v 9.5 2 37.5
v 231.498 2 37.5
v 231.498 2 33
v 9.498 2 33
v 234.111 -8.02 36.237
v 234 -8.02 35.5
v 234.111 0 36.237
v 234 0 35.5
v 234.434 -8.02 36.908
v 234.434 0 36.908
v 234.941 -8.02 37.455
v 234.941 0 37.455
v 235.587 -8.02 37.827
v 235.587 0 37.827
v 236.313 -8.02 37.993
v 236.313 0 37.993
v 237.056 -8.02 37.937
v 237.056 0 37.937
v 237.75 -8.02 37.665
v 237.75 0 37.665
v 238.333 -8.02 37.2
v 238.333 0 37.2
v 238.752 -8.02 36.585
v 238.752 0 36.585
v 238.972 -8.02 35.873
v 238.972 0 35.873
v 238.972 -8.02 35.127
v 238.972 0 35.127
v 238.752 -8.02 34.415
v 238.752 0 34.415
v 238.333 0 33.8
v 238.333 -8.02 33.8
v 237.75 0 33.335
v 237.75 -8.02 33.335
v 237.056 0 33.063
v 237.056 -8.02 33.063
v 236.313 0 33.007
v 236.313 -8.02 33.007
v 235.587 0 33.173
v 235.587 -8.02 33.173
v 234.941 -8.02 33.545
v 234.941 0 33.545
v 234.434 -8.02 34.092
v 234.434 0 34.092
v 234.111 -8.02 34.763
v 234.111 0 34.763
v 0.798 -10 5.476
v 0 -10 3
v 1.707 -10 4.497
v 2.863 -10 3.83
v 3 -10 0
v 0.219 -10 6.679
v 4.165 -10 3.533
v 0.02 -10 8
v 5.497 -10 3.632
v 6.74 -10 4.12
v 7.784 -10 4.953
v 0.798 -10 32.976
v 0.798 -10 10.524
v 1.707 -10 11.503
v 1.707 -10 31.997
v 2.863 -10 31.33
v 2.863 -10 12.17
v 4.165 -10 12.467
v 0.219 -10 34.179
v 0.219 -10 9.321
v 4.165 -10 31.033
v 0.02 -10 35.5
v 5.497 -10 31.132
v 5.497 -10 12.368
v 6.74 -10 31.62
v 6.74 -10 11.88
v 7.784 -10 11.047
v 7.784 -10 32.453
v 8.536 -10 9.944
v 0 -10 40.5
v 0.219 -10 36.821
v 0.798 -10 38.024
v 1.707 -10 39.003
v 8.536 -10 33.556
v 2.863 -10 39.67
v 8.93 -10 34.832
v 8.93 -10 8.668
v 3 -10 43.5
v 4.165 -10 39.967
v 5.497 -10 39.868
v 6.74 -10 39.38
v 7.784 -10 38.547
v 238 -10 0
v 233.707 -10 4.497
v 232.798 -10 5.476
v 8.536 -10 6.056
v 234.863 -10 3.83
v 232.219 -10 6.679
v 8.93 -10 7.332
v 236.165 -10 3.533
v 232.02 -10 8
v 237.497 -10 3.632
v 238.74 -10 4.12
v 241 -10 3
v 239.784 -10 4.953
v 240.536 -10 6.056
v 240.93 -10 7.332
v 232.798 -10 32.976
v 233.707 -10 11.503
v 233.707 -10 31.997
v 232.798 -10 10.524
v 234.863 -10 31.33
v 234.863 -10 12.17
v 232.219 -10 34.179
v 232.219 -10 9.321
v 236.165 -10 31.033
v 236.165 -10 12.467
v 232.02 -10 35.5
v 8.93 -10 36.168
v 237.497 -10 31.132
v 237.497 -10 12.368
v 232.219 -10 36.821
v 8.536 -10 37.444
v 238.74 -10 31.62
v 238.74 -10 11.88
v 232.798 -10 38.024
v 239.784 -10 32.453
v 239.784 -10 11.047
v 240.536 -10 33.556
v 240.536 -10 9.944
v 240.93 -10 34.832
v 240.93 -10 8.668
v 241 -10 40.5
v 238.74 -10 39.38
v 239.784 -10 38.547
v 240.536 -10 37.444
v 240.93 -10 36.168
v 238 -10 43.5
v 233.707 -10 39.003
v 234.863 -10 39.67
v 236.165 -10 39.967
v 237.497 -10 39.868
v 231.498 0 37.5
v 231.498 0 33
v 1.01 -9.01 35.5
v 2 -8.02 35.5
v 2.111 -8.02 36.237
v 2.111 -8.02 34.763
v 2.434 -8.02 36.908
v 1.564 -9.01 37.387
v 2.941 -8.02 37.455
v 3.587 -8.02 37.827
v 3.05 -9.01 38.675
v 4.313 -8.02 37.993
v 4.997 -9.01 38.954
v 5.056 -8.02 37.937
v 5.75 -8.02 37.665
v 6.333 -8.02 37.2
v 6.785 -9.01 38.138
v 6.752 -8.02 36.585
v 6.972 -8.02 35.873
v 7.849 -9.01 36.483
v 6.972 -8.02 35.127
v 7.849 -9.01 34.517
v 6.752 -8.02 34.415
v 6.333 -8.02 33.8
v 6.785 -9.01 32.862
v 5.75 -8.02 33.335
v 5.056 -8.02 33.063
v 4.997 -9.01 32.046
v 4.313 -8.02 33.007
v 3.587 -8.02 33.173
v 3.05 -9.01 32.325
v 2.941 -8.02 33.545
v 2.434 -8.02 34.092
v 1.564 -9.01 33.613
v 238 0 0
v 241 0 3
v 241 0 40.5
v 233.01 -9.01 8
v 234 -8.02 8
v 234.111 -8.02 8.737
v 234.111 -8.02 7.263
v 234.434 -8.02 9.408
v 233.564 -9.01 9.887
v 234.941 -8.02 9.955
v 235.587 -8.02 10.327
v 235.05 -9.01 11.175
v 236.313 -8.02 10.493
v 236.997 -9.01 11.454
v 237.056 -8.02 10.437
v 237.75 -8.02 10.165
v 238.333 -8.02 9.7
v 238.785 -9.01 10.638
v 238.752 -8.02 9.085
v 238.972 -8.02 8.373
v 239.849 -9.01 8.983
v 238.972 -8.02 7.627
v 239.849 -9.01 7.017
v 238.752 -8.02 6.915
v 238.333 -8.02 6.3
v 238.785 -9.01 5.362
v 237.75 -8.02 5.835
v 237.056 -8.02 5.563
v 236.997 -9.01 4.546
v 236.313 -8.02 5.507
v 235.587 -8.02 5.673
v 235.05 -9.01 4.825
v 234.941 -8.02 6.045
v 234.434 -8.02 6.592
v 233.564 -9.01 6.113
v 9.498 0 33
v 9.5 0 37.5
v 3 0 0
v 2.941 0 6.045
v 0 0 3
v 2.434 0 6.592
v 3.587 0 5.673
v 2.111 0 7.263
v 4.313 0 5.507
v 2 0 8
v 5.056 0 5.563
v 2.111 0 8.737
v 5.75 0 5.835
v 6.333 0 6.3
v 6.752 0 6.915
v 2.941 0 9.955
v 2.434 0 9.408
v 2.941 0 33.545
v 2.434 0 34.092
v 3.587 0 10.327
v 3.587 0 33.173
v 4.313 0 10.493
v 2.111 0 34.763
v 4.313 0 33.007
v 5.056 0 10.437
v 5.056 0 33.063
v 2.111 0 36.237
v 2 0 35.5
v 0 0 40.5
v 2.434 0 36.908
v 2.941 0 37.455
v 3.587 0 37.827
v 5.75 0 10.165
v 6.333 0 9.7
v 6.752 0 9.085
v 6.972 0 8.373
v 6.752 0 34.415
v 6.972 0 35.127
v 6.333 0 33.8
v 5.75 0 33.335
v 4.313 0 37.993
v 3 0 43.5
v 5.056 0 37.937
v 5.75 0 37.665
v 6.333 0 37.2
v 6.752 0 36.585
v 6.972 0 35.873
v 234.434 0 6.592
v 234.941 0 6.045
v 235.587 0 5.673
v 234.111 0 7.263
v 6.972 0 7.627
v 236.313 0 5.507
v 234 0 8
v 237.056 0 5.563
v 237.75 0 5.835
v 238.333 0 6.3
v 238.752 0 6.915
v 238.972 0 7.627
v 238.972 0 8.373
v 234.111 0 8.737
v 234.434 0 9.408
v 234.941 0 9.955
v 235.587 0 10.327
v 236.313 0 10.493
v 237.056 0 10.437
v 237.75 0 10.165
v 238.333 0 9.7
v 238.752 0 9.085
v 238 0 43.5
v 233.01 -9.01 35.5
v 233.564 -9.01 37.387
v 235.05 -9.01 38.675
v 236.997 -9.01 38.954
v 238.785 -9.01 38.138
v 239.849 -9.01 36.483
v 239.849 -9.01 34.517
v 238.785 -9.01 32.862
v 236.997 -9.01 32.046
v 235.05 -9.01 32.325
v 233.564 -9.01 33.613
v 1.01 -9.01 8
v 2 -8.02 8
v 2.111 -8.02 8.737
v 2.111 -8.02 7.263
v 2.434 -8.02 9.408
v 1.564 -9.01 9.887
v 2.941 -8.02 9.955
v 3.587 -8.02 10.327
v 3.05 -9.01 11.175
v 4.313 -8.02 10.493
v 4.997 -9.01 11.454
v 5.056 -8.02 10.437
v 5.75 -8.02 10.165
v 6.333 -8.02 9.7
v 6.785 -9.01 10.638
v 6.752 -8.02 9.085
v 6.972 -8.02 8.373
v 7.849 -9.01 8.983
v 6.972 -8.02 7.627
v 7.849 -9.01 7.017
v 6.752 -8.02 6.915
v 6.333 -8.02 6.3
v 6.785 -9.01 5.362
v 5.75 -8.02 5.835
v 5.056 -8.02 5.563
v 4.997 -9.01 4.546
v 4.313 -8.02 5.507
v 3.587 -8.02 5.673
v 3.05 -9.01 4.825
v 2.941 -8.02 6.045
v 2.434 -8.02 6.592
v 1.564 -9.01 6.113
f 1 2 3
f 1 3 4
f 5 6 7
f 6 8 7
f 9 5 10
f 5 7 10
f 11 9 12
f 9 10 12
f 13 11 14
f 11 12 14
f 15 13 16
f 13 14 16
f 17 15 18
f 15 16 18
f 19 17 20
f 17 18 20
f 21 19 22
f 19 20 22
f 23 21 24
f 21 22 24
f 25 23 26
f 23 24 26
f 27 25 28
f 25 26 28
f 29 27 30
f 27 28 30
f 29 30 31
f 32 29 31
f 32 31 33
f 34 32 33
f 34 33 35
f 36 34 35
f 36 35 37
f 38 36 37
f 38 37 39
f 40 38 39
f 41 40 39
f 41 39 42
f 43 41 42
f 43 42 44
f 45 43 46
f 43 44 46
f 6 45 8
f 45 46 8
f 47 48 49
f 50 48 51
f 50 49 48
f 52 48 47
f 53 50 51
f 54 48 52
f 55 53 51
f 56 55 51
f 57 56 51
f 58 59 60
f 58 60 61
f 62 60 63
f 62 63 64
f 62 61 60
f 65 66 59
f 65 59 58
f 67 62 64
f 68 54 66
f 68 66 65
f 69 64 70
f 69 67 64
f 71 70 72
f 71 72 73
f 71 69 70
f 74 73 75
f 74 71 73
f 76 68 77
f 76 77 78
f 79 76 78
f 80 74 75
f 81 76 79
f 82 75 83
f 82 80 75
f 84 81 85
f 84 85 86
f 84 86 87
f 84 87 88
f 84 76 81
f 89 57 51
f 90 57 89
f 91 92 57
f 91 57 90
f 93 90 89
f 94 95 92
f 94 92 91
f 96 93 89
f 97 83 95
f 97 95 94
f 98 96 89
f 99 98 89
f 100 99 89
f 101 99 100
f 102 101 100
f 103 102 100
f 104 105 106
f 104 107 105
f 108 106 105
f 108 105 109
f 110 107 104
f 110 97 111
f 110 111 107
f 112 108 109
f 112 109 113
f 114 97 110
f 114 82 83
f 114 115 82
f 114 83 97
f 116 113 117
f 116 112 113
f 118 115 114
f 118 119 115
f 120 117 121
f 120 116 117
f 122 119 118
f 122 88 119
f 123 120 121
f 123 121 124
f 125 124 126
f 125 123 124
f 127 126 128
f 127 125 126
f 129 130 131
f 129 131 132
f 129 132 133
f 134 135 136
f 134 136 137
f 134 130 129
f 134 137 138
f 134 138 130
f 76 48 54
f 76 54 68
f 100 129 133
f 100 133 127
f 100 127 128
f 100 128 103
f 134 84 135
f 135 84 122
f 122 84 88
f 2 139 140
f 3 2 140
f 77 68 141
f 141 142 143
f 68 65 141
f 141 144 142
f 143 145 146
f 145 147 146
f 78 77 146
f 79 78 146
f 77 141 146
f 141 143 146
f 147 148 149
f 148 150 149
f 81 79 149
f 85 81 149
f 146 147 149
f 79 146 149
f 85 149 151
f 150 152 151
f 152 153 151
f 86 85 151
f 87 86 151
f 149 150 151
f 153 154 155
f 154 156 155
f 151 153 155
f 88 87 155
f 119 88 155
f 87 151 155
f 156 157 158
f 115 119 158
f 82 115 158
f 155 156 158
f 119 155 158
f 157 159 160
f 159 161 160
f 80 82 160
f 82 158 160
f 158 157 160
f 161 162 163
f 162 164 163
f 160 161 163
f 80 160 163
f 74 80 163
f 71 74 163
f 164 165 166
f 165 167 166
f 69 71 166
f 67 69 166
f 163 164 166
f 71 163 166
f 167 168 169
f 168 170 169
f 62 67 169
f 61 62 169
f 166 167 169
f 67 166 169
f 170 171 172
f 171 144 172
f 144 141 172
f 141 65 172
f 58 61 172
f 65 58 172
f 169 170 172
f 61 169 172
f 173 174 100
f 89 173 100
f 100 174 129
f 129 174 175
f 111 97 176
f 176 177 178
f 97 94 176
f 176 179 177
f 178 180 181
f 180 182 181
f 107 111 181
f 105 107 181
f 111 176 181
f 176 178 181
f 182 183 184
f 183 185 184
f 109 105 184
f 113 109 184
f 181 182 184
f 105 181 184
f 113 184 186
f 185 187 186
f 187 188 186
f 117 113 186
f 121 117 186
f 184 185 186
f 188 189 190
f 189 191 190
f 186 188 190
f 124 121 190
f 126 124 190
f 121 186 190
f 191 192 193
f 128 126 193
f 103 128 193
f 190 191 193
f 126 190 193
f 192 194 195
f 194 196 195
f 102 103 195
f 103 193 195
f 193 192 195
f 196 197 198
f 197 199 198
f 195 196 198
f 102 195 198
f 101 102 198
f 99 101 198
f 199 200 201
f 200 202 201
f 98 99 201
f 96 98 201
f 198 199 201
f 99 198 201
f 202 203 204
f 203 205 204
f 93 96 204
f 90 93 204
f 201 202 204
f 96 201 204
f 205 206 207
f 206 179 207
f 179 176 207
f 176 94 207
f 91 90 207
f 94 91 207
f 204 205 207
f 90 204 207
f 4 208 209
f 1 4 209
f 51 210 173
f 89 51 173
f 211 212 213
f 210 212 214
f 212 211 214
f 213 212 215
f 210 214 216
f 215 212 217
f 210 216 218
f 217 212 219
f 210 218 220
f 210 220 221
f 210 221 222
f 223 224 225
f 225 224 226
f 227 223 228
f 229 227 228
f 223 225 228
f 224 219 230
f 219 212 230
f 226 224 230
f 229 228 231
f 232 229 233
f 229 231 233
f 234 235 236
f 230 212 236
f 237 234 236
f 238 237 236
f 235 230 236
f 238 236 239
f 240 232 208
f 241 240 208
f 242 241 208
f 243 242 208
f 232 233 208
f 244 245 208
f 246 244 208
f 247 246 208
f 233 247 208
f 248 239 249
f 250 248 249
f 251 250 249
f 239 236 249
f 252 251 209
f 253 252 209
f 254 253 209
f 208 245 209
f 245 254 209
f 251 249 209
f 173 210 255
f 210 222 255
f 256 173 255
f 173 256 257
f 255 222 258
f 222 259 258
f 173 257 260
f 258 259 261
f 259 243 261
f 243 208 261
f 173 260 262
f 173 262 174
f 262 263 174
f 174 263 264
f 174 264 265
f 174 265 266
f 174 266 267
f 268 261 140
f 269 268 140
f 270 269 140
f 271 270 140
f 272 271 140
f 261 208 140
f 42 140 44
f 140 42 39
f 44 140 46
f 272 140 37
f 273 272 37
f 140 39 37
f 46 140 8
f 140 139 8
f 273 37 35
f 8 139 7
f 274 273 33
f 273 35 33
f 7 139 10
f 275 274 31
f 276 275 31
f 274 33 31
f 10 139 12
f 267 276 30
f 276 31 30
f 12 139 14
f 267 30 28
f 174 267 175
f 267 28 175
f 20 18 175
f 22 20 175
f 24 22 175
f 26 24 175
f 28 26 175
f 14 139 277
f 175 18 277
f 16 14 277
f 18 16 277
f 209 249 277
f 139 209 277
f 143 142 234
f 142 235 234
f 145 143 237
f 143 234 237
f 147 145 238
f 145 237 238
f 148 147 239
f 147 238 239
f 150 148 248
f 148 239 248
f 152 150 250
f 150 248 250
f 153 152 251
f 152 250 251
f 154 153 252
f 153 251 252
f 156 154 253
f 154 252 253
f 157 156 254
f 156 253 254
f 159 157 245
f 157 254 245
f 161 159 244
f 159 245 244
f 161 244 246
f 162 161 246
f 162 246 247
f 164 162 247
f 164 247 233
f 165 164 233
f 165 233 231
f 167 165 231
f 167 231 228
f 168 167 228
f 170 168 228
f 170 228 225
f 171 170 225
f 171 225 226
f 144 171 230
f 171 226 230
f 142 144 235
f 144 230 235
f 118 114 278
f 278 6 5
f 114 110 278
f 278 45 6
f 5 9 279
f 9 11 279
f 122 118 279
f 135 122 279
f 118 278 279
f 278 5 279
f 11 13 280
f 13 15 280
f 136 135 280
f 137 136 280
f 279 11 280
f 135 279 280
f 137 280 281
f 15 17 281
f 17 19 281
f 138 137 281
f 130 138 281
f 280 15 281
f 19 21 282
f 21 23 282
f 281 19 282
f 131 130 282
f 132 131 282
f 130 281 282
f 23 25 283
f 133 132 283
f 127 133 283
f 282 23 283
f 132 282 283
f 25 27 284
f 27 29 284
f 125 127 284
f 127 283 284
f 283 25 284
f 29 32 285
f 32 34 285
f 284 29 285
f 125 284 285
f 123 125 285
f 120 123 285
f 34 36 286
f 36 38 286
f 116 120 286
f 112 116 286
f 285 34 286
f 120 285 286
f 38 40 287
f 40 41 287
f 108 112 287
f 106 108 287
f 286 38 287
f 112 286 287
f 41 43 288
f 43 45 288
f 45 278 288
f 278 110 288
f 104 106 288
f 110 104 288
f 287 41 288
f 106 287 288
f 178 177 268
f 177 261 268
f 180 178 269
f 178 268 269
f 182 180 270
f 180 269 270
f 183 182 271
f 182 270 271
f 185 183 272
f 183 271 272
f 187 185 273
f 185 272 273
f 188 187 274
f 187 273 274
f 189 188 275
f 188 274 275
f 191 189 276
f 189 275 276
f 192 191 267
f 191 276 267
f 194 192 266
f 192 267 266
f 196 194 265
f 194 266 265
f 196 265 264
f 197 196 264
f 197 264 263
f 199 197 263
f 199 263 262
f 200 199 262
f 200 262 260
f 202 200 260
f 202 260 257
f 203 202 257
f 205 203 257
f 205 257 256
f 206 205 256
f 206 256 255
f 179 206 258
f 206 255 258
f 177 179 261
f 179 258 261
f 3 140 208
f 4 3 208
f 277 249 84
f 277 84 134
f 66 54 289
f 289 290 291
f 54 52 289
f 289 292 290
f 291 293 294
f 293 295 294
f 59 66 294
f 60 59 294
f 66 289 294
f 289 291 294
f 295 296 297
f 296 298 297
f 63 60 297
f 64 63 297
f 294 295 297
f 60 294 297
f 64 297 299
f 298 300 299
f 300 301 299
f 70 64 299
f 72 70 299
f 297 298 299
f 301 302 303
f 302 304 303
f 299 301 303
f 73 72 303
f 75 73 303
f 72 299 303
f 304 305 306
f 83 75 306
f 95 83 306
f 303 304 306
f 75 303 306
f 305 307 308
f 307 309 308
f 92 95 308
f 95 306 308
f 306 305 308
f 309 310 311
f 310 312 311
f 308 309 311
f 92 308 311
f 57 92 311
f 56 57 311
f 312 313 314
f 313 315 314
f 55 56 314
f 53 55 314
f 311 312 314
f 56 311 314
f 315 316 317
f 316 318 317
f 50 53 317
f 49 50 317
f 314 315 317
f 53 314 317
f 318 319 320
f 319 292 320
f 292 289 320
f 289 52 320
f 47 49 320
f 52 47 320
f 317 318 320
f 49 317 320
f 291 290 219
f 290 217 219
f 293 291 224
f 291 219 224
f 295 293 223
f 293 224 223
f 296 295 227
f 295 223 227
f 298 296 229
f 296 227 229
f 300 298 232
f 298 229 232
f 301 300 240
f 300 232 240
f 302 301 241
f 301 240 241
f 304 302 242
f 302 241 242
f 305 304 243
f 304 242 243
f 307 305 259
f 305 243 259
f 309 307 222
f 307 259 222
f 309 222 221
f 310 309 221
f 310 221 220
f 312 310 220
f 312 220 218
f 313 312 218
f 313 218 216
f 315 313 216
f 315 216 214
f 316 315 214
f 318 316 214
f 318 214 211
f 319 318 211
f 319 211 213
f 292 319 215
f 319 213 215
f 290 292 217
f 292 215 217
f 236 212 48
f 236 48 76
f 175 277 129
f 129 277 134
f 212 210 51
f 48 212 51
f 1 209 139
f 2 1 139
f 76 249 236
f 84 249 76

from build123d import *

# Parameters (mm, degrees)
F0_W           = 241
F0_H           = 43.5
F1_DEPTH       = 10
F2_SIZE        = 3
F4_DEPTH       = 2
F6_D           = 5
F6_CSINK_D     = 8.96
F6_CSINK_ANGLE = 90


with BuildPart() as f1:
    # F0 (on Front) → F1 (new body)
    with BuildSketch(Plane.XZ):
        with Locations((120.5, 21.75)):
            Rectangle(F0_W, F0_H)
    extrude(amount=F1_DEPTH)

    # F2
    f2_edges = [f1.edges().sort_by_distance(p)[0] for p in [
        (241, -5, 43.5),
        (241, -5, 0),
        (0, -5, 43.5),
        (0, -5, 0),
    ]]
    chamfer(f2_edges, length=F2_SIZE)

    # F3 (on face) → F4 (join)
    with BuildSketch(Plane(origin=(0, 0, 0), x_dir=(-1, 0, 0), z_dir=(0, 1, 0))):
        Polygon((-9.4982709692, 33.0000003319), (-9.4999992993, 37.5), (-231.4982709692, 37.5), (-231.4982709692, 33.0000003319), align=None)
    extrude(amount=F4_DEPTH)

    # F6 (through all)
    with Locations(Plane.XZ.offset(10)):
        with Locations((236.5, 35.5), (236.5, 8), (4.5, 35.5), (4.5, 8)):
            CounterSinkHole(F6_D / 2, F6_CSINK_D / 2, counter_sink_angle=F6_CSINK_ANGLE)


solid = f1.part
